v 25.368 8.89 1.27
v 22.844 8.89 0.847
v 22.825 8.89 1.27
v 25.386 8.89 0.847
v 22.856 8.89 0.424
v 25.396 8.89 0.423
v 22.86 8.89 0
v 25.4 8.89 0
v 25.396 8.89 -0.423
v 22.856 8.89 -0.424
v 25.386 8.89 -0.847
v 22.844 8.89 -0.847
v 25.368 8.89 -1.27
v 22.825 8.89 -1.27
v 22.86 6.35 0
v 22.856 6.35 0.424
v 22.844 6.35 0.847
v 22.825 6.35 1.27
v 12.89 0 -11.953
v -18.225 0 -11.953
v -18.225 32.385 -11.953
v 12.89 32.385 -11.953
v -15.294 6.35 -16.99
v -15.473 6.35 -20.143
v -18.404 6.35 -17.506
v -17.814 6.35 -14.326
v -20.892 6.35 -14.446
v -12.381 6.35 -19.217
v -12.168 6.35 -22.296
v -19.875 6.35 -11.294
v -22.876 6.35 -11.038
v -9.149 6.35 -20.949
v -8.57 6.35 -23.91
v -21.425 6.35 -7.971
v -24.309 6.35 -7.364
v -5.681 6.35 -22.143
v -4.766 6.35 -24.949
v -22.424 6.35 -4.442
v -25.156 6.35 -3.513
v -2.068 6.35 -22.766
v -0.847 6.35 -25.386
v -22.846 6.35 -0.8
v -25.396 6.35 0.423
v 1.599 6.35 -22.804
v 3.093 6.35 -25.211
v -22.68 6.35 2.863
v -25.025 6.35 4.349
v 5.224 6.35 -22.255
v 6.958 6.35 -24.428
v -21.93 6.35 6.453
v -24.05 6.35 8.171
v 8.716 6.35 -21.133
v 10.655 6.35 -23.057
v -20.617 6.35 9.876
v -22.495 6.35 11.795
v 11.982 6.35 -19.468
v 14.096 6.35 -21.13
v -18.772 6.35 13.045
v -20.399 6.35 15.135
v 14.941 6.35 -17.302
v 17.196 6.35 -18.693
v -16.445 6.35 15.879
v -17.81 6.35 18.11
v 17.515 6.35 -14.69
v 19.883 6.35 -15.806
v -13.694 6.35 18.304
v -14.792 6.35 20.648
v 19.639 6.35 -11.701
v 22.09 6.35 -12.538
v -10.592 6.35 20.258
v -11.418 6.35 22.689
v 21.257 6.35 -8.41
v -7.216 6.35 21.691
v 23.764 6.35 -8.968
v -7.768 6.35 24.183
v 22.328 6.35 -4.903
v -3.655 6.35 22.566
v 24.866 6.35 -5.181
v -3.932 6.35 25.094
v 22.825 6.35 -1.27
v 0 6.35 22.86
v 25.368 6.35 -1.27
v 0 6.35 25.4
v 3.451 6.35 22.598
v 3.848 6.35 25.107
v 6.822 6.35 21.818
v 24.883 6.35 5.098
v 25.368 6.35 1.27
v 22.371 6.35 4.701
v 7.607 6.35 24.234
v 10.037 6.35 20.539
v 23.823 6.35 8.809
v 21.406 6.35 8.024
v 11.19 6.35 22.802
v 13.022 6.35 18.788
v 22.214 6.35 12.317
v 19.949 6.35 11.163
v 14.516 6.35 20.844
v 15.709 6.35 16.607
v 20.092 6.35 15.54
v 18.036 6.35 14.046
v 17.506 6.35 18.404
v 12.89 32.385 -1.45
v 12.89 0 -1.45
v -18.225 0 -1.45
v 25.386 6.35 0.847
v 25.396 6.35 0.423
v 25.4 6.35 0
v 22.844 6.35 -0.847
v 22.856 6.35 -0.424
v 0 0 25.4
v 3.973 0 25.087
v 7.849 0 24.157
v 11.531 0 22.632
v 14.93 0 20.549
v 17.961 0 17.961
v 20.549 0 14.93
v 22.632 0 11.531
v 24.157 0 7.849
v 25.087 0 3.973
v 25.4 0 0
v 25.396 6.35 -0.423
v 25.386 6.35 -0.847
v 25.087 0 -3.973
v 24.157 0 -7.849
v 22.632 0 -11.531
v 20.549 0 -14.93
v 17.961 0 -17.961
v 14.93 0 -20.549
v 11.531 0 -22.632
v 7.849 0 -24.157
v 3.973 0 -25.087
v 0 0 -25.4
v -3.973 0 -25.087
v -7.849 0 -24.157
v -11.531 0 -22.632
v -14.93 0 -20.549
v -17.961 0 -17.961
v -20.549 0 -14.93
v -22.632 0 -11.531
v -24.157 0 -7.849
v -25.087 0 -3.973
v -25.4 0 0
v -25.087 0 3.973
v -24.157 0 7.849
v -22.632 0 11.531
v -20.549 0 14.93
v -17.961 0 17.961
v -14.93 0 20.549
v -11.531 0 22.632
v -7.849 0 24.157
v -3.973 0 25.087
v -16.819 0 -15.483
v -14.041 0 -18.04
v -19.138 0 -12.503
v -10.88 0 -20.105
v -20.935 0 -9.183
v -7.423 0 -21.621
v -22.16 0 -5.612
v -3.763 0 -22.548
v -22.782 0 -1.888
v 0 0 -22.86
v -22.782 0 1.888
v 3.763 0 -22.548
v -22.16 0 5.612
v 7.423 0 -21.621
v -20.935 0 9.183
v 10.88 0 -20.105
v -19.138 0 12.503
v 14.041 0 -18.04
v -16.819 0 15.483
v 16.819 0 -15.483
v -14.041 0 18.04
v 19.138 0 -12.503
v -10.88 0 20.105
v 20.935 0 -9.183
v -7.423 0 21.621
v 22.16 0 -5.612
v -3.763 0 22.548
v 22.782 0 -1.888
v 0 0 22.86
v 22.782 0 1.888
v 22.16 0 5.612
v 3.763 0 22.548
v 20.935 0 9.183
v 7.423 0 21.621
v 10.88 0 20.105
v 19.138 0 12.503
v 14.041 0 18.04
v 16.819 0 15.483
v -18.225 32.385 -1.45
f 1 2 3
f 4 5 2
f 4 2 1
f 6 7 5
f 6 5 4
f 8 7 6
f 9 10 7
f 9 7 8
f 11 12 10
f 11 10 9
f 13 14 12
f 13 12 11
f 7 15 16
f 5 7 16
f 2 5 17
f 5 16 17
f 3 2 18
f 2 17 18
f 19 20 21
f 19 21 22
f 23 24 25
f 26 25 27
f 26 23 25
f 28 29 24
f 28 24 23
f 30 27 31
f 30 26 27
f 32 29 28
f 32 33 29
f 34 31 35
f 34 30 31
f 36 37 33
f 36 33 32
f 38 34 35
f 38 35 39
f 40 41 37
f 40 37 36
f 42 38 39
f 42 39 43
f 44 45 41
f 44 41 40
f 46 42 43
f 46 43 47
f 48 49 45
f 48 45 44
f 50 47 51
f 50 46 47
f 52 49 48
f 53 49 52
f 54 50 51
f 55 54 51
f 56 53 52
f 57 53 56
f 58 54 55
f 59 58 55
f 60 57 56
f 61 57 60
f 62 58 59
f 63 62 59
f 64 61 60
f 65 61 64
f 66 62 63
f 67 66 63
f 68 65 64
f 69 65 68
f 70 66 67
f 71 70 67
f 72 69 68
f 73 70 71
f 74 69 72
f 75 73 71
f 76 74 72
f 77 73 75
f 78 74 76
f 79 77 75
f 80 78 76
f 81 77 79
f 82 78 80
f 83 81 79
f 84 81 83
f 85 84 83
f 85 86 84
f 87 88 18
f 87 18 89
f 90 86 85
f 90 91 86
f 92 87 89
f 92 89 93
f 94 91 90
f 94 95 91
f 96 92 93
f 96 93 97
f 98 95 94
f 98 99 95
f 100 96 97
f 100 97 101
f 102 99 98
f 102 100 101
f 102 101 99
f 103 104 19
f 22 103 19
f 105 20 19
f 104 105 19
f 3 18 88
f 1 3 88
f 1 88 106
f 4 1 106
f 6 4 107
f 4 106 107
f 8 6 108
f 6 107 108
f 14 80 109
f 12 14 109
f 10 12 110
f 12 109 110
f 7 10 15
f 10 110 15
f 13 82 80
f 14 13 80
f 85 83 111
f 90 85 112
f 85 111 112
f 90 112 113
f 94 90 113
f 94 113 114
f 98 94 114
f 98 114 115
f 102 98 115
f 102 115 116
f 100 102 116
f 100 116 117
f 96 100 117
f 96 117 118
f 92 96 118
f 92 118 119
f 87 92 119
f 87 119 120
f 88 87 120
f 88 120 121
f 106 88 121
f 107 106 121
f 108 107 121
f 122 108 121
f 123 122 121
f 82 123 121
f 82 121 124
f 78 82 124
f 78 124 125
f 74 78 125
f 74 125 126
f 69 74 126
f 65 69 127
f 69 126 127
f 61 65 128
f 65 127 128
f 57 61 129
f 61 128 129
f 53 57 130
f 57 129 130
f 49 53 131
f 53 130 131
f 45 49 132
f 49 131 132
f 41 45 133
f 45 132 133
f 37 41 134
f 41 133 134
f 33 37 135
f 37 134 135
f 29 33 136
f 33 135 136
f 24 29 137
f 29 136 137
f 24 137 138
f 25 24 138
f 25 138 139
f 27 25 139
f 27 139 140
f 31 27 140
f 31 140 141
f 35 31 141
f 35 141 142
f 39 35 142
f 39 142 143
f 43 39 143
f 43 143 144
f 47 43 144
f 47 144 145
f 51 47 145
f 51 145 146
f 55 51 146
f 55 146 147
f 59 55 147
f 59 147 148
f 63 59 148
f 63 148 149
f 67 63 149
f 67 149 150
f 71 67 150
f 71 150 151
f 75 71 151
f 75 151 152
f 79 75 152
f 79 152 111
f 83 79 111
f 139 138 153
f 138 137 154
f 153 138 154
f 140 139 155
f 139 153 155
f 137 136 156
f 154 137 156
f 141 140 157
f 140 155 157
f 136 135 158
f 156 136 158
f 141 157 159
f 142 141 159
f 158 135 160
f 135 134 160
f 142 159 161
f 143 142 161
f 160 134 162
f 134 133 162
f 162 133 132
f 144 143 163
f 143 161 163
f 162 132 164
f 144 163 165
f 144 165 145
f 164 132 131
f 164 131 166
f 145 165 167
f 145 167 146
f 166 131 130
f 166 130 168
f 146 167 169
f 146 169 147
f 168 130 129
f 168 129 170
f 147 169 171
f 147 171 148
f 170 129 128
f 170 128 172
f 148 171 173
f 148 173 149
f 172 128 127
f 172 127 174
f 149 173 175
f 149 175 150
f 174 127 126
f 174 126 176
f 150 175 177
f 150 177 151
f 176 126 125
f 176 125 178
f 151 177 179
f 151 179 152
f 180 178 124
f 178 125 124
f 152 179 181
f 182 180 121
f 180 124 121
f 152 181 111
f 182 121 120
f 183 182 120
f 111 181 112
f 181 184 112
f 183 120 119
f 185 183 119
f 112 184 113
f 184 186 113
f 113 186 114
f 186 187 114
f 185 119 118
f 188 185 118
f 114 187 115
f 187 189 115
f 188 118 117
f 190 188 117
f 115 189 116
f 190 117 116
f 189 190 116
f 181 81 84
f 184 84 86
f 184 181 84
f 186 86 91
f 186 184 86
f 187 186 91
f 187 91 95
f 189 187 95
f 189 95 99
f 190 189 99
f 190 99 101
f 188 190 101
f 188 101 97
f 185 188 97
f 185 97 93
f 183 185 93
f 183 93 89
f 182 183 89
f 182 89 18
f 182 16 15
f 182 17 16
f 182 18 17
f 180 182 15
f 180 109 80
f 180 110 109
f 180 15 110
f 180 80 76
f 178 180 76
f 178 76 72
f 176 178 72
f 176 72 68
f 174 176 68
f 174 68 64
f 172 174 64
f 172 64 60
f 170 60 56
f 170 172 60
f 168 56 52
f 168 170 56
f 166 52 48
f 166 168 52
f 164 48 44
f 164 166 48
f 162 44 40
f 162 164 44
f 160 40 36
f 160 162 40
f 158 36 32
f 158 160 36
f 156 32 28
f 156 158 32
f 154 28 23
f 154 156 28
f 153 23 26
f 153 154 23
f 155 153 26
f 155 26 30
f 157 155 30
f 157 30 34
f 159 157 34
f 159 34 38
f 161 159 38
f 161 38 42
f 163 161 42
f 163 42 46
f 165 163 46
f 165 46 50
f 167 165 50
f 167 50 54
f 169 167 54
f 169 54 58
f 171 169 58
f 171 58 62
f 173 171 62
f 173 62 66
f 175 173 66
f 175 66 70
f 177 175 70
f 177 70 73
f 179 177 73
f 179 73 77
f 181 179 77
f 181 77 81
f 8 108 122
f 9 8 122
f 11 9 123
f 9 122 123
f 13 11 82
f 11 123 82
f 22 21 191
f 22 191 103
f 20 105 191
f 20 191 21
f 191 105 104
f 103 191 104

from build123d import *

# Parameters (mm, degrees)
SKETCH1_W           = 31.115
SKETCH1_H           = 10.5029
BOSS_EXTRUDE1_DEPTH = 32.385
SKETCH1_8_R         = 25.4
SKETCH1_8_R_2       = 22.86
BOSS_EXTRUDE4_DEPTH = 6.35
BOSS_EXTRUDE5_START = 6.35
BOSS_EXTRUDE5_DEPTH = 2.54


with BuildPart() as part:
    # Sketch1 → Boss-Extrude1 (new body)
    with BuildSketch(Plane(origin=(0, 0, 0), x_dir=(1, 0, 0), z_dir=(0, 1, 0))):
        with Locations((-2.667913404, 6.70111363)):
            Rectangle(SKETCH1_W, SKETCH1_H)
    extrude(amount=BOSS_EXTRUDE1_DEPTH)


with BuildPart() as body_2:
    # Sketch1<8> → Boss-Extrude4 (new body)
    with BuildSketch(Plane(origin=(0, 0, 0), x_dir=(1, 0, 0), z_dir=(0, 1, 0))):
        with Locations(Location((0, 0, 0), (0, 0, 270))):
            Circle(SKETCH1_8_R)
        with Locations(Location((0, 0, 0), (0, 0, 270))):
            Circle(SKETCH1_8_R_2, mode=Mode.SUBTRACT)
    extrude(amount=BOSS_EXTRUDE4_DEPTH)

    # Sketch1<9> → Boss-Extrude5 (add)
    with BuildSketch(Plane(origin=(0, 0, 0), x_dir=(1, 0, 0), z_dir=(0, 1, 0)).offset(BOSS_EXTRUDE5_START)):
        with BuildLine():
            Line((25.368230131, 1.27), (22.82469496, 1.27))
            ThreePointArc((22.82469496, 1.27), (22.851172035, 0.635245316), (22.86, 0))
            ThreePointArc((22.86, 0), (22.851172035, -0.635245316), (22.82469496, -1.27))
            Line((22.82469496, -1.27), (25.368230131, -1.27))
            ThreePointArc((25.368230131, -1.27), (25.392056291, -0.635198655), (25.4, 0))
            ThreePointArc((25.4, 0), (25.392056291, 0.635198655), (25.368230131, 1.27))
        make_face()
    extrude(amount=BOSS_EXTRUDE5_DEPTH)


solid = Compound([part.part, body_2.part])
